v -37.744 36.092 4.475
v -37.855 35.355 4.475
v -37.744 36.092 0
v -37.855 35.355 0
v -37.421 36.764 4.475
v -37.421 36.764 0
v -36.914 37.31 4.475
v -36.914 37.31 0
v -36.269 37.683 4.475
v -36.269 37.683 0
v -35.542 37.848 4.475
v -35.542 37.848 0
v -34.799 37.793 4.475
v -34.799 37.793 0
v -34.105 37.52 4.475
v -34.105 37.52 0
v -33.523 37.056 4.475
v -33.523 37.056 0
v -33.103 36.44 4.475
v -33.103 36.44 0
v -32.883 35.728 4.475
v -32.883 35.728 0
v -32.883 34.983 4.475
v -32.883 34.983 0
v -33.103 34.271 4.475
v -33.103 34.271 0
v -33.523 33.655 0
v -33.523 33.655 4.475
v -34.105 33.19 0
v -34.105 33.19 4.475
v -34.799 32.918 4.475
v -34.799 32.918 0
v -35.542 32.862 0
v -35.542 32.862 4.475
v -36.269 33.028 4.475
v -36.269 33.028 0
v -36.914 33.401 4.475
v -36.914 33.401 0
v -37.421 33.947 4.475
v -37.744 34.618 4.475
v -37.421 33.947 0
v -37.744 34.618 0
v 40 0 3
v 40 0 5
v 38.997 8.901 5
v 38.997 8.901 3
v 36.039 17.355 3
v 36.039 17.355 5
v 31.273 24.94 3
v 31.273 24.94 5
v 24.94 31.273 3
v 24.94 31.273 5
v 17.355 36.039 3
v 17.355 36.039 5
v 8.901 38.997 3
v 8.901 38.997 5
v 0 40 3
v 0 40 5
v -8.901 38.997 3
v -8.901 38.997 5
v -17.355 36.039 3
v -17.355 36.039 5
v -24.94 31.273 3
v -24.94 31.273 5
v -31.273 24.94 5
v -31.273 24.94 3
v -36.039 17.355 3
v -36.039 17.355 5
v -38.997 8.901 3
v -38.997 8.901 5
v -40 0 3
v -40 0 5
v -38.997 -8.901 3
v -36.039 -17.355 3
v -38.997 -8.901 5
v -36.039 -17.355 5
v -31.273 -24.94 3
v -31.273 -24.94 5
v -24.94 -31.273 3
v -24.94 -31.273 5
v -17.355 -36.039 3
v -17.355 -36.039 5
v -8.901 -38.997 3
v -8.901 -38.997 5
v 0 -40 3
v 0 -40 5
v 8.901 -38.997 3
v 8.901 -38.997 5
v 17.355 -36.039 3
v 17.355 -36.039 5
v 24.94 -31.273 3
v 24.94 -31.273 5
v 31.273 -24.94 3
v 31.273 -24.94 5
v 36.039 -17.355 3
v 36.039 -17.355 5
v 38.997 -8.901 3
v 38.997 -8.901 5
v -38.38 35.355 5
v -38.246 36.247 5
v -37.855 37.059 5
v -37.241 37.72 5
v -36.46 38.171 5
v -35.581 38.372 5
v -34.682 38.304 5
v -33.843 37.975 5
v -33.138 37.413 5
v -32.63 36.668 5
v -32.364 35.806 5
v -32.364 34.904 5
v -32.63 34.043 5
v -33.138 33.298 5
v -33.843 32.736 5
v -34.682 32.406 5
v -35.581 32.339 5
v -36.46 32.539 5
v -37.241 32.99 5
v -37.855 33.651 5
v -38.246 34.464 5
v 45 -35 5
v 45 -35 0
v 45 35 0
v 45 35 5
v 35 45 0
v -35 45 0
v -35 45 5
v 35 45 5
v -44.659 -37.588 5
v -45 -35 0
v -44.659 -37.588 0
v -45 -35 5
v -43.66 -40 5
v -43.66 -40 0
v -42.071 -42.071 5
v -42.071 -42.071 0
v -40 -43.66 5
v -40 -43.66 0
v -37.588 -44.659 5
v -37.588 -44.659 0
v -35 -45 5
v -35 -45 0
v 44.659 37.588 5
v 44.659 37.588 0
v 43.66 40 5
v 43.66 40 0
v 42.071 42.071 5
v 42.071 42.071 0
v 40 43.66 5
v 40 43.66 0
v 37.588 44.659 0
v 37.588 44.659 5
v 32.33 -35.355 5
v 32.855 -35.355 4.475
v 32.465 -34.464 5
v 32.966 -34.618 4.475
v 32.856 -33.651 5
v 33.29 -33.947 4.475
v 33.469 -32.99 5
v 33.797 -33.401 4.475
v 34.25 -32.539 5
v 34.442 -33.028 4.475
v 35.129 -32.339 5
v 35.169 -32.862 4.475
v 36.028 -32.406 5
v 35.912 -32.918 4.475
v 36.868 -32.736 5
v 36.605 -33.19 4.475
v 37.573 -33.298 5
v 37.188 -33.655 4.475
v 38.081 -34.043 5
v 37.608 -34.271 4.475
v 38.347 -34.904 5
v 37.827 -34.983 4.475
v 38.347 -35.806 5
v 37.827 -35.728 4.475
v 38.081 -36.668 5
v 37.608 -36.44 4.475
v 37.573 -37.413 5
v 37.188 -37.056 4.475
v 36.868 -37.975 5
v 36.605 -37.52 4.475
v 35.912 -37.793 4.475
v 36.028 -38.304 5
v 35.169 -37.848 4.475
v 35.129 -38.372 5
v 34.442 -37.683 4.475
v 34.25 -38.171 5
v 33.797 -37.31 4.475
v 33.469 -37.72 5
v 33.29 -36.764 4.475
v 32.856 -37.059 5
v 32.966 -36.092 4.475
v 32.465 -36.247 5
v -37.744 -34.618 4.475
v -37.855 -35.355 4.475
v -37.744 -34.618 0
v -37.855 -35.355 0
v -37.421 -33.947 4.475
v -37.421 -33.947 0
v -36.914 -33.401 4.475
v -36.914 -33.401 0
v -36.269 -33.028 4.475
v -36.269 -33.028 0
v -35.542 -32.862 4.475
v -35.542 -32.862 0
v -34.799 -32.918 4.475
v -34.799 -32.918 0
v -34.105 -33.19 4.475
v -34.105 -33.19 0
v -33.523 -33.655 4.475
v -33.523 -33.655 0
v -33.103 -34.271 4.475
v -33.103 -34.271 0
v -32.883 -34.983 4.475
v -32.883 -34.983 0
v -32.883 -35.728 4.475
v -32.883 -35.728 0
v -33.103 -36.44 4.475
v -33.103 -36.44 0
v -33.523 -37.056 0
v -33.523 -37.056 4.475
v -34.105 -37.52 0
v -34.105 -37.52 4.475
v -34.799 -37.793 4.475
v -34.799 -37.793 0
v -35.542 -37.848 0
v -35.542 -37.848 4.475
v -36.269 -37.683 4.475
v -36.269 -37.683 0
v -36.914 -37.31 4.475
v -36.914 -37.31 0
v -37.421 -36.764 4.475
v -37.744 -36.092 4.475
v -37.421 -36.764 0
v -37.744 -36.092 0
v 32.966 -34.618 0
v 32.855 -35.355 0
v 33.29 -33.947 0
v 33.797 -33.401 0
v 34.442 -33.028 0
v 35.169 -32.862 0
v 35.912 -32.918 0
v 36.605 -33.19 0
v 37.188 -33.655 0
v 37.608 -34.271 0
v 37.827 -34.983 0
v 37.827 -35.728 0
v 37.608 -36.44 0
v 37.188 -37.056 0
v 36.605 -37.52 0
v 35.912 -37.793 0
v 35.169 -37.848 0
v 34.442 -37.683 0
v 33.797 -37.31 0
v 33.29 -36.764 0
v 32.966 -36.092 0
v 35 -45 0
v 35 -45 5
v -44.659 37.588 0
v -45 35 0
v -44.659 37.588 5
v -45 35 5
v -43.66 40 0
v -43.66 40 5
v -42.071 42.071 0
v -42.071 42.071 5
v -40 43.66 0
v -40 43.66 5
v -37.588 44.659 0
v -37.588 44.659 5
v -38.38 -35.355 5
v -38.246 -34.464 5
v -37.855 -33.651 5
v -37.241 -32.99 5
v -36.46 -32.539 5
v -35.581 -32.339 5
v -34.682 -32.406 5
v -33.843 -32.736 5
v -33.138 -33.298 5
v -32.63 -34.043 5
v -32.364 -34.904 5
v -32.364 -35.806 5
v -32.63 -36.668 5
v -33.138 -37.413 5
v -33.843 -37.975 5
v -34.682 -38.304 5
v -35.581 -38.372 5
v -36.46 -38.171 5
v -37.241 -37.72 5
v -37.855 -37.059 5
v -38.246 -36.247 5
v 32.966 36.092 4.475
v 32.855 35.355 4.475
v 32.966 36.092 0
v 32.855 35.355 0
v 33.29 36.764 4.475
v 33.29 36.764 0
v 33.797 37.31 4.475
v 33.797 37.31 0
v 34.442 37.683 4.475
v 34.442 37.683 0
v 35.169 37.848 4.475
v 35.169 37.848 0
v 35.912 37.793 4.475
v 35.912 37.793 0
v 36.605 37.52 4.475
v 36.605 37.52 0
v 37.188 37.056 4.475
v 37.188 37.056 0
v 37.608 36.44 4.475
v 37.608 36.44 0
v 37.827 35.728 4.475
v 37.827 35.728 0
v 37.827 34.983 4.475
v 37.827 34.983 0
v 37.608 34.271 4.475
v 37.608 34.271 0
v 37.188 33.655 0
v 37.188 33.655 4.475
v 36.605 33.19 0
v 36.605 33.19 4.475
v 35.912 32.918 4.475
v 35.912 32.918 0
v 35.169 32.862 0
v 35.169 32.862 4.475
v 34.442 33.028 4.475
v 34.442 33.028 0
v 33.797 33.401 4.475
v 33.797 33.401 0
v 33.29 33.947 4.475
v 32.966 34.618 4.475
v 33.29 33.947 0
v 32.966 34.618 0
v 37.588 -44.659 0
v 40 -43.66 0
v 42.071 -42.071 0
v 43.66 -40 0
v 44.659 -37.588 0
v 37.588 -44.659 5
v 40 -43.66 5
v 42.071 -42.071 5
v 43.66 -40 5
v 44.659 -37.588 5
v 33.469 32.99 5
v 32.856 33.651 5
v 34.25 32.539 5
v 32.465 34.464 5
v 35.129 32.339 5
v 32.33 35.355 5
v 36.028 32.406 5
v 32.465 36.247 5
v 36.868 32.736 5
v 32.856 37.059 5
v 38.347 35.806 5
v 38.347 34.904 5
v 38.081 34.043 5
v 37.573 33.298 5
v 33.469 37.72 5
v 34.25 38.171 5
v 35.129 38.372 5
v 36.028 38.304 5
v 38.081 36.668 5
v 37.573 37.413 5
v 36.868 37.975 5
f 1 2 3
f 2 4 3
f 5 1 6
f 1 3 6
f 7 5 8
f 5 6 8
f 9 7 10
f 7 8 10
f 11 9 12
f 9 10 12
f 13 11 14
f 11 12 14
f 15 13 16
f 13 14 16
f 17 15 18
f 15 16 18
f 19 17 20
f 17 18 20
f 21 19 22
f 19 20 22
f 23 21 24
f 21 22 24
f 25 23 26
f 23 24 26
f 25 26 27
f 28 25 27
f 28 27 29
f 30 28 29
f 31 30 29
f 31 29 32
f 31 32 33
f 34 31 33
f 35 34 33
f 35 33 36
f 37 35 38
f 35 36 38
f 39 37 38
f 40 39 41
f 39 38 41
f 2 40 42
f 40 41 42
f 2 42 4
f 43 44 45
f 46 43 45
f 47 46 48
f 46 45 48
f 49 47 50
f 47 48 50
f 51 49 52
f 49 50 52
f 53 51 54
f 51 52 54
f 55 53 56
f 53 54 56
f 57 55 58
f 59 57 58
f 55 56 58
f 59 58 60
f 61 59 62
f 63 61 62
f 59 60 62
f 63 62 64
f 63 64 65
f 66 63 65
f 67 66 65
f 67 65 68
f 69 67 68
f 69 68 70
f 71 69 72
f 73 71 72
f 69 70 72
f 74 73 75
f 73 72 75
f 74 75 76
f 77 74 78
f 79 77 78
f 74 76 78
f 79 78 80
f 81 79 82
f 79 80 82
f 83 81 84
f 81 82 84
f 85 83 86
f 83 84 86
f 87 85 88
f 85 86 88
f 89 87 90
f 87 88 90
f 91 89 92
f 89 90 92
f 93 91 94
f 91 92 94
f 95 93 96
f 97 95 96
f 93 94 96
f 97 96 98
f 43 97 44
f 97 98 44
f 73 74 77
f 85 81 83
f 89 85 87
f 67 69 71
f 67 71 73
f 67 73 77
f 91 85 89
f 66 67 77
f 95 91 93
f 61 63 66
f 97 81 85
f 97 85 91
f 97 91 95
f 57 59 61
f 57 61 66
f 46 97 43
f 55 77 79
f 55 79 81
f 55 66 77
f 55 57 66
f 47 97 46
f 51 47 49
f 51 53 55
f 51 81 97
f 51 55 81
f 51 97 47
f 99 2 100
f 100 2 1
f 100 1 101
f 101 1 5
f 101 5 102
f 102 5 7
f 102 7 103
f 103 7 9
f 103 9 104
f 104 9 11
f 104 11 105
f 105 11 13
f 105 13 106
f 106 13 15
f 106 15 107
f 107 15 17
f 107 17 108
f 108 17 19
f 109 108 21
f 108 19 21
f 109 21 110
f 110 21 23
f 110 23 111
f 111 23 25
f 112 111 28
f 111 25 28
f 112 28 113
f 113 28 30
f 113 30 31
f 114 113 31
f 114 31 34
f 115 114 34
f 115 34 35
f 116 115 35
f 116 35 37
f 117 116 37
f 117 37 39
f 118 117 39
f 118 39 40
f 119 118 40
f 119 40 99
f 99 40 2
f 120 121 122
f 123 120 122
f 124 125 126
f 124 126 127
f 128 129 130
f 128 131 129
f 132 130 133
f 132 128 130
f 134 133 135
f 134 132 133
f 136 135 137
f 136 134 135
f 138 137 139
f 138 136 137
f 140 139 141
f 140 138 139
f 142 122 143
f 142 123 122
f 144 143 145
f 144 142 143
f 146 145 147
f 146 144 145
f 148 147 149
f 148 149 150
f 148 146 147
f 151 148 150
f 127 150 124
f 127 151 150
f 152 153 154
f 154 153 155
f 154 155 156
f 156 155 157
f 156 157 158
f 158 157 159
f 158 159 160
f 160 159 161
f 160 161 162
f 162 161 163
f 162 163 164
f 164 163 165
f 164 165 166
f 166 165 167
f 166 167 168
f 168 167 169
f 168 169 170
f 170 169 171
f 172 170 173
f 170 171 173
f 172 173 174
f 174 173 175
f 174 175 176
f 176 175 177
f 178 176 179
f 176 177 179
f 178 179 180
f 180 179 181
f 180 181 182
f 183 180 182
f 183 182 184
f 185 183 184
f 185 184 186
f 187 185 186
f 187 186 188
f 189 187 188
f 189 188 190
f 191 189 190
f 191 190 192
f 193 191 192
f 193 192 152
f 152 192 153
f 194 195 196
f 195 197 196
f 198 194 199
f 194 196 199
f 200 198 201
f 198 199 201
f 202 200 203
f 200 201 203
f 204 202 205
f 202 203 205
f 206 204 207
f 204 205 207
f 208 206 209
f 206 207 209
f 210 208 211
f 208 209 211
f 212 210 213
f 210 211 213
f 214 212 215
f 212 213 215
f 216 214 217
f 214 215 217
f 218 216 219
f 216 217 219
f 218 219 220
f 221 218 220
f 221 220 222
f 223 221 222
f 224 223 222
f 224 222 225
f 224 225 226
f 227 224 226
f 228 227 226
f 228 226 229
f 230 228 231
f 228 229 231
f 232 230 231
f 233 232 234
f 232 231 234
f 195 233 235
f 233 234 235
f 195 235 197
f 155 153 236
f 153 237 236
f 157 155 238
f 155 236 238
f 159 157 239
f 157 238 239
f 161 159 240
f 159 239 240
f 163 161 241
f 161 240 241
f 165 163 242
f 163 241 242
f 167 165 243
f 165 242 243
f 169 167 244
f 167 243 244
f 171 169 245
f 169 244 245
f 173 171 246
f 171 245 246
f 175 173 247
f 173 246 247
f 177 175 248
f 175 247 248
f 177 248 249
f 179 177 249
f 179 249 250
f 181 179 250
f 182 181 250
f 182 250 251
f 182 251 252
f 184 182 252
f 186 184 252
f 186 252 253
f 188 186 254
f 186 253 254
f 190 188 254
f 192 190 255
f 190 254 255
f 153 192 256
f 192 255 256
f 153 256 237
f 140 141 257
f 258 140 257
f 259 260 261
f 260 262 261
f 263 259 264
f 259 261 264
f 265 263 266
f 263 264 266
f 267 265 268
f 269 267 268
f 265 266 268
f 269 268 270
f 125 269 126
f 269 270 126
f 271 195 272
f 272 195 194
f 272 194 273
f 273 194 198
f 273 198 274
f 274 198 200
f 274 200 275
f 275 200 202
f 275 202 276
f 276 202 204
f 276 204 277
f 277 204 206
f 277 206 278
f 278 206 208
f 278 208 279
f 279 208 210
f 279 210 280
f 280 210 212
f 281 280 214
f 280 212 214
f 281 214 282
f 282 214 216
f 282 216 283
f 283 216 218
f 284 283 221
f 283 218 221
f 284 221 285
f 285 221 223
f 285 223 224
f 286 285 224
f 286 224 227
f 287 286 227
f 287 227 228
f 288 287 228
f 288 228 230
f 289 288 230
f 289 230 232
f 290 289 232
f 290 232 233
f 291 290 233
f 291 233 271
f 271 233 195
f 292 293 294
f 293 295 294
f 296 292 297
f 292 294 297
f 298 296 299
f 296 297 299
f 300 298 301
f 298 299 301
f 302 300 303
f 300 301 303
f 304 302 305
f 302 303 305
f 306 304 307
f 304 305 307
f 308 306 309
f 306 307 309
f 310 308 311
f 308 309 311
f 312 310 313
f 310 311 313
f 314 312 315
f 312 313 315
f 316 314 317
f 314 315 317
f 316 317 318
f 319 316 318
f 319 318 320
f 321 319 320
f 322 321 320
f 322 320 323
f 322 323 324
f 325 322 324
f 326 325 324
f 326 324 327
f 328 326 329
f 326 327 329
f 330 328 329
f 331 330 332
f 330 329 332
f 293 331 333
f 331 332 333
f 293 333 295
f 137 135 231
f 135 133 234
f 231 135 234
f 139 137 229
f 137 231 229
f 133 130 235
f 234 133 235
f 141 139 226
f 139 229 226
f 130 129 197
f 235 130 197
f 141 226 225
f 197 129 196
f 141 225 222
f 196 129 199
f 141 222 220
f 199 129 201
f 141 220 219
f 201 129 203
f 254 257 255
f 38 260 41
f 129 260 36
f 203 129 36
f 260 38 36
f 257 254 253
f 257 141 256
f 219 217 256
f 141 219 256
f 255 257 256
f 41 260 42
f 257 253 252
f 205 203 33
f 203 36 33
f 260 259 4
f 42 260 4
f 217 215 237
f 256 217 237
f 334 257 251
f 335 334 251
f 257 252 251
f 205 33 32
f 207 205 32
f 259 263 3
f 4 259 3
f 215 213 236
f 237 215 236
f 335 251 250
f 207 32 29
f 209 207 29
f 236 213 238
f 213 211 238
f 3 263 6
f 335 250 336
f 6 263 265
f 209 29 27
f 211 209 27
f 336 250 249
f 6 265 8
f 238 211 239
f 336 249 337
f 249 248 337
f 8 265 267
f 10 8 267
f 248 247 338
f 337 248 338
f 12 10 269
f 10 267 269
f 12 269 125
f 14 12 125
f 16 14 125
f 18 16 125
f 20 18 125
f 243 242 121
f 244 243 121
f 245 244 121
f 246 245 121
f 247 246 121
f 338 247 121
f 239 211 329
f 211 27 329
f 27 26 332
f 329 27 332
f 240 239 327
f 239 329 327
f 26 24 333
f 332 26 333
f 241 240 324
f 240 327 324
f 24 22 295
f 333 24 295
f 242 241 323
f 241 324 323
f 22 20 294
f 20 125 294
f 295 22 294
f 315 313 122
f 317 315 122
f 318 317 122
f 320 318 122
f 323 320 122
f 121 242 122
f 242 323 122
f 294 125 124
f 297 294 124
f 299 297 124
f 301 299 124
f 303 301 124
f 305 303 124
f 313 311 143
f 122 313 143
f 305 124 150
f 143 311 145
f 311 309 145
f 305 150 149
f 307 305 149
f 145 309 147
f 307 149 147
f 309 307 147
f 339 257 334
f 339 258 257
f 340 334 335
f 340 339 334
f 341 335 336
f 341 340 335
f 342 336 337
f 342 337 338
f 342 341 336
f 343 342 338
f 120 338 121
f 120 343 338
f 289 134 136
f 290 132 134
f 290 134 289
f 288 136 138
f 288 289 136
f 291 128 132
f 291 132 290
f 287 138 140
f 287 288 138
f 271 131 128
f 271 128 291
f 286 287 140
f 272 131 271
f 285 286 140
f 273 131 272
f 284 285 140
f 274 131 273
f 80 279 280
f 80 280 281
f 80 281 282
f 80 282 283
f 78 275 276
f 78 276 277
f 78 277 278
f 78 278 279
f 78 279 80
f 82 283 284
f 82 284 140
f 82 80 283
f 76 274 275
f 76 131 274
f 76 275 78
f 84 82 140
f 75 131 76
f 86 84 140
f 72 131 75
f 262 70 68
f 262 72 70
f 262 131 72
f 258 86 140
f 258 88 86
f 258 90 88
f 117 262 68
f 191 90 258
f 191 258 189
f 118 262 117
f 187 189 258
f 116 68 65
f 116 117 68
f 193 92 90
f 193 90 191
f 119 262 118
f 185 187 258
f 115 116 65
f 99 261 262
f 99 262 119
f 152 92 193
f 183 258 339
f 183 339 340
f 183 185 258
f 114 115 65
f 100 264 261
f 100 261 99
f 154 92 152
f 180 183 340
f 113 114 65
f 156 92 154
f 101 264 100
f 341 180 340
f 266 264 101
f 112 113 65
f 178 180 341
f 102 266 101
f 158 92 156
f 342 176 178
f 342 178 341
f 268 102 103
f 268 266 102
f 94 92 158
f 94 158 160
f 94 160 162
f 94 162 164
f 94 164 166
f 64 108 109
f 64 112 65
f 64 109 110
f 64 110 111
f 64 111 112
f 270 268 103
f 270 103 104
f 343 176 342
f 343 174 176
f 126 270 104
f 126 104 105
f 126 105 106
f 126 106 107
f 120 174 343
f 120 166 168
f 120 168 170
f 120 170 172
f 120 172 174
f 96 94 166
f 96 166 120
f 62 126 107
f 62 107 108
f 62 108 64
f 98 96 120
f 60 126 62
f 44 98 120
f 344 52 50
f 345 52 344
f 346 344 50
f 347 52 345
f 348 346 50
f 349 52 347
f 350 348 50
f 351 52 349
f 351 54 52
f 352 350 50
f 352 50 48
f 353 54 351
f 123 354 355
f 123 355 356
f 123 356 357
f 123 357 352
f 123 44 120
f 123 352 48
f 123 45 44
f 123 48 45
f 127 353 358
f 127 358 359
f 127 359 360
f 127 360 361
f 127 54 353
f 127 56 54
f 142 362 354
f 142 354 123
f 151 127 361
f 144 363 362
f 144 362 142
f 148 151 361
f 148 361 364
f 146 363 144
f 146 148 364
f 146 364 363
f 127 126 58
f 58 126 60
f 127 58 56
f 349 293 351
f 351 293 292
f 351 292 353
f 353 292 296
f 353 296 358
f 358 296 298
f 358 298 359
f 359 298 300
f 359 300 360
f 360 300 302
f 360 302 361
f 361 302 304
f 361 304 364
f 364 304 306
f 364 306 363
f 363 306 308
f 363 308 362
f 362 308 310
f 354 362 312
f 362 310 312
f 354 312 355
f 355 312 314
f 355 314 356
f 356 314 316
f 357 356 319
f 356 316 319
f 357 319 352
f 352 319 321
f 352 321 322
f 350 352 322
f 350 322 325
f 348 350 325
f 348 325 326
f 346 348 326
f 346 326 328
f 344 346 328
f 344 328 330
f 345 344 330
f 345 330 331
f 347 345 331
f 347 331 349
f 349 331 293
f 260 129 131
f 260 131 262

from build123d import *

# Parameters (mm, degrees)
SKETCH_1_W                   = 90
SKETCH_1_H                   = 90
EXTRUDE_1_DEPTH              = 5
FILLET_1_R                   = 10
HOLE_WIZARD_M6_1_D           = 5
HOLE_WIZARD_M6_1_DEPTH       = 17
HOLE_WIZARD_M6_1_CSINK_D     = 6.05
HOLE_WIZARD_M6_1_CSINK_ANGLE = 90
HOLE_WIZARD_M6_1_TIP         = 1.502151548
SKETCH_4_R                   = 40
CUT_EXTRUDE_1_DEPTH          = 2


with BuildPart() as part:
    # 草图1 → 凸台-拉伸1 (new body)
    with BuildSketch(Plane.XY):
        Rectangle(SKETCH_1_W, SKETCH_1_H)
    extrude(amount=EXTRUDE_1_DEPTH)

    # 圆角1
    fillet_1_edges = [part.edges().sort_by_distance(p)[0] for p in [
        (45, -45, 2.5),
        (-45, -45, 2.5),
        (-45, 45, 2.5),
        (45, 45, 2.5),
    ]]
    fillet(fillet_1_edges, radius=FILLET_1_R)

    # M6 螺纹孔1
    with Locations(Plane.XY.offset(5)):
        with Locations((35.355339059, -35.355339059), (-35.355339059, 35.355339059), (35.355339059, 35.355339059), (-35.355339059, -35.355339059)):
            CounterSinkHole(HOLE_WIZARD_M6_1_D / 2, HOLE_WIZARD_M6_1_CSINK_D / 2, depth=HOLE_WIZARD_M6_1_DEPTH, counter_sink_angle=HOLE_WIZARD_M6_1_CSINK_ANGLE)
            with Locations((0, 0, -(HOLE_WIZARD_M6_1_DEPTH + HOLE_WIZARD_M6_1_TIP / 2))):  # 118° drill point
                Cone(0, HOLE_WIZARD_M6_1_D / 2, HOLE_WIZARD_M6_1_TIP, mode=Mode.SUBTRACT)

    # 草图4 → 切除-拉伸1 (cut)
    with BuildSketch(Plane.XY.offset(5)):
        Circle(SKETCH_4_R)
    extrude(amount=-CUT_EXTRUDE_1_DEPTH, mode=Mode.SUBTRACT)


solid = part.part
